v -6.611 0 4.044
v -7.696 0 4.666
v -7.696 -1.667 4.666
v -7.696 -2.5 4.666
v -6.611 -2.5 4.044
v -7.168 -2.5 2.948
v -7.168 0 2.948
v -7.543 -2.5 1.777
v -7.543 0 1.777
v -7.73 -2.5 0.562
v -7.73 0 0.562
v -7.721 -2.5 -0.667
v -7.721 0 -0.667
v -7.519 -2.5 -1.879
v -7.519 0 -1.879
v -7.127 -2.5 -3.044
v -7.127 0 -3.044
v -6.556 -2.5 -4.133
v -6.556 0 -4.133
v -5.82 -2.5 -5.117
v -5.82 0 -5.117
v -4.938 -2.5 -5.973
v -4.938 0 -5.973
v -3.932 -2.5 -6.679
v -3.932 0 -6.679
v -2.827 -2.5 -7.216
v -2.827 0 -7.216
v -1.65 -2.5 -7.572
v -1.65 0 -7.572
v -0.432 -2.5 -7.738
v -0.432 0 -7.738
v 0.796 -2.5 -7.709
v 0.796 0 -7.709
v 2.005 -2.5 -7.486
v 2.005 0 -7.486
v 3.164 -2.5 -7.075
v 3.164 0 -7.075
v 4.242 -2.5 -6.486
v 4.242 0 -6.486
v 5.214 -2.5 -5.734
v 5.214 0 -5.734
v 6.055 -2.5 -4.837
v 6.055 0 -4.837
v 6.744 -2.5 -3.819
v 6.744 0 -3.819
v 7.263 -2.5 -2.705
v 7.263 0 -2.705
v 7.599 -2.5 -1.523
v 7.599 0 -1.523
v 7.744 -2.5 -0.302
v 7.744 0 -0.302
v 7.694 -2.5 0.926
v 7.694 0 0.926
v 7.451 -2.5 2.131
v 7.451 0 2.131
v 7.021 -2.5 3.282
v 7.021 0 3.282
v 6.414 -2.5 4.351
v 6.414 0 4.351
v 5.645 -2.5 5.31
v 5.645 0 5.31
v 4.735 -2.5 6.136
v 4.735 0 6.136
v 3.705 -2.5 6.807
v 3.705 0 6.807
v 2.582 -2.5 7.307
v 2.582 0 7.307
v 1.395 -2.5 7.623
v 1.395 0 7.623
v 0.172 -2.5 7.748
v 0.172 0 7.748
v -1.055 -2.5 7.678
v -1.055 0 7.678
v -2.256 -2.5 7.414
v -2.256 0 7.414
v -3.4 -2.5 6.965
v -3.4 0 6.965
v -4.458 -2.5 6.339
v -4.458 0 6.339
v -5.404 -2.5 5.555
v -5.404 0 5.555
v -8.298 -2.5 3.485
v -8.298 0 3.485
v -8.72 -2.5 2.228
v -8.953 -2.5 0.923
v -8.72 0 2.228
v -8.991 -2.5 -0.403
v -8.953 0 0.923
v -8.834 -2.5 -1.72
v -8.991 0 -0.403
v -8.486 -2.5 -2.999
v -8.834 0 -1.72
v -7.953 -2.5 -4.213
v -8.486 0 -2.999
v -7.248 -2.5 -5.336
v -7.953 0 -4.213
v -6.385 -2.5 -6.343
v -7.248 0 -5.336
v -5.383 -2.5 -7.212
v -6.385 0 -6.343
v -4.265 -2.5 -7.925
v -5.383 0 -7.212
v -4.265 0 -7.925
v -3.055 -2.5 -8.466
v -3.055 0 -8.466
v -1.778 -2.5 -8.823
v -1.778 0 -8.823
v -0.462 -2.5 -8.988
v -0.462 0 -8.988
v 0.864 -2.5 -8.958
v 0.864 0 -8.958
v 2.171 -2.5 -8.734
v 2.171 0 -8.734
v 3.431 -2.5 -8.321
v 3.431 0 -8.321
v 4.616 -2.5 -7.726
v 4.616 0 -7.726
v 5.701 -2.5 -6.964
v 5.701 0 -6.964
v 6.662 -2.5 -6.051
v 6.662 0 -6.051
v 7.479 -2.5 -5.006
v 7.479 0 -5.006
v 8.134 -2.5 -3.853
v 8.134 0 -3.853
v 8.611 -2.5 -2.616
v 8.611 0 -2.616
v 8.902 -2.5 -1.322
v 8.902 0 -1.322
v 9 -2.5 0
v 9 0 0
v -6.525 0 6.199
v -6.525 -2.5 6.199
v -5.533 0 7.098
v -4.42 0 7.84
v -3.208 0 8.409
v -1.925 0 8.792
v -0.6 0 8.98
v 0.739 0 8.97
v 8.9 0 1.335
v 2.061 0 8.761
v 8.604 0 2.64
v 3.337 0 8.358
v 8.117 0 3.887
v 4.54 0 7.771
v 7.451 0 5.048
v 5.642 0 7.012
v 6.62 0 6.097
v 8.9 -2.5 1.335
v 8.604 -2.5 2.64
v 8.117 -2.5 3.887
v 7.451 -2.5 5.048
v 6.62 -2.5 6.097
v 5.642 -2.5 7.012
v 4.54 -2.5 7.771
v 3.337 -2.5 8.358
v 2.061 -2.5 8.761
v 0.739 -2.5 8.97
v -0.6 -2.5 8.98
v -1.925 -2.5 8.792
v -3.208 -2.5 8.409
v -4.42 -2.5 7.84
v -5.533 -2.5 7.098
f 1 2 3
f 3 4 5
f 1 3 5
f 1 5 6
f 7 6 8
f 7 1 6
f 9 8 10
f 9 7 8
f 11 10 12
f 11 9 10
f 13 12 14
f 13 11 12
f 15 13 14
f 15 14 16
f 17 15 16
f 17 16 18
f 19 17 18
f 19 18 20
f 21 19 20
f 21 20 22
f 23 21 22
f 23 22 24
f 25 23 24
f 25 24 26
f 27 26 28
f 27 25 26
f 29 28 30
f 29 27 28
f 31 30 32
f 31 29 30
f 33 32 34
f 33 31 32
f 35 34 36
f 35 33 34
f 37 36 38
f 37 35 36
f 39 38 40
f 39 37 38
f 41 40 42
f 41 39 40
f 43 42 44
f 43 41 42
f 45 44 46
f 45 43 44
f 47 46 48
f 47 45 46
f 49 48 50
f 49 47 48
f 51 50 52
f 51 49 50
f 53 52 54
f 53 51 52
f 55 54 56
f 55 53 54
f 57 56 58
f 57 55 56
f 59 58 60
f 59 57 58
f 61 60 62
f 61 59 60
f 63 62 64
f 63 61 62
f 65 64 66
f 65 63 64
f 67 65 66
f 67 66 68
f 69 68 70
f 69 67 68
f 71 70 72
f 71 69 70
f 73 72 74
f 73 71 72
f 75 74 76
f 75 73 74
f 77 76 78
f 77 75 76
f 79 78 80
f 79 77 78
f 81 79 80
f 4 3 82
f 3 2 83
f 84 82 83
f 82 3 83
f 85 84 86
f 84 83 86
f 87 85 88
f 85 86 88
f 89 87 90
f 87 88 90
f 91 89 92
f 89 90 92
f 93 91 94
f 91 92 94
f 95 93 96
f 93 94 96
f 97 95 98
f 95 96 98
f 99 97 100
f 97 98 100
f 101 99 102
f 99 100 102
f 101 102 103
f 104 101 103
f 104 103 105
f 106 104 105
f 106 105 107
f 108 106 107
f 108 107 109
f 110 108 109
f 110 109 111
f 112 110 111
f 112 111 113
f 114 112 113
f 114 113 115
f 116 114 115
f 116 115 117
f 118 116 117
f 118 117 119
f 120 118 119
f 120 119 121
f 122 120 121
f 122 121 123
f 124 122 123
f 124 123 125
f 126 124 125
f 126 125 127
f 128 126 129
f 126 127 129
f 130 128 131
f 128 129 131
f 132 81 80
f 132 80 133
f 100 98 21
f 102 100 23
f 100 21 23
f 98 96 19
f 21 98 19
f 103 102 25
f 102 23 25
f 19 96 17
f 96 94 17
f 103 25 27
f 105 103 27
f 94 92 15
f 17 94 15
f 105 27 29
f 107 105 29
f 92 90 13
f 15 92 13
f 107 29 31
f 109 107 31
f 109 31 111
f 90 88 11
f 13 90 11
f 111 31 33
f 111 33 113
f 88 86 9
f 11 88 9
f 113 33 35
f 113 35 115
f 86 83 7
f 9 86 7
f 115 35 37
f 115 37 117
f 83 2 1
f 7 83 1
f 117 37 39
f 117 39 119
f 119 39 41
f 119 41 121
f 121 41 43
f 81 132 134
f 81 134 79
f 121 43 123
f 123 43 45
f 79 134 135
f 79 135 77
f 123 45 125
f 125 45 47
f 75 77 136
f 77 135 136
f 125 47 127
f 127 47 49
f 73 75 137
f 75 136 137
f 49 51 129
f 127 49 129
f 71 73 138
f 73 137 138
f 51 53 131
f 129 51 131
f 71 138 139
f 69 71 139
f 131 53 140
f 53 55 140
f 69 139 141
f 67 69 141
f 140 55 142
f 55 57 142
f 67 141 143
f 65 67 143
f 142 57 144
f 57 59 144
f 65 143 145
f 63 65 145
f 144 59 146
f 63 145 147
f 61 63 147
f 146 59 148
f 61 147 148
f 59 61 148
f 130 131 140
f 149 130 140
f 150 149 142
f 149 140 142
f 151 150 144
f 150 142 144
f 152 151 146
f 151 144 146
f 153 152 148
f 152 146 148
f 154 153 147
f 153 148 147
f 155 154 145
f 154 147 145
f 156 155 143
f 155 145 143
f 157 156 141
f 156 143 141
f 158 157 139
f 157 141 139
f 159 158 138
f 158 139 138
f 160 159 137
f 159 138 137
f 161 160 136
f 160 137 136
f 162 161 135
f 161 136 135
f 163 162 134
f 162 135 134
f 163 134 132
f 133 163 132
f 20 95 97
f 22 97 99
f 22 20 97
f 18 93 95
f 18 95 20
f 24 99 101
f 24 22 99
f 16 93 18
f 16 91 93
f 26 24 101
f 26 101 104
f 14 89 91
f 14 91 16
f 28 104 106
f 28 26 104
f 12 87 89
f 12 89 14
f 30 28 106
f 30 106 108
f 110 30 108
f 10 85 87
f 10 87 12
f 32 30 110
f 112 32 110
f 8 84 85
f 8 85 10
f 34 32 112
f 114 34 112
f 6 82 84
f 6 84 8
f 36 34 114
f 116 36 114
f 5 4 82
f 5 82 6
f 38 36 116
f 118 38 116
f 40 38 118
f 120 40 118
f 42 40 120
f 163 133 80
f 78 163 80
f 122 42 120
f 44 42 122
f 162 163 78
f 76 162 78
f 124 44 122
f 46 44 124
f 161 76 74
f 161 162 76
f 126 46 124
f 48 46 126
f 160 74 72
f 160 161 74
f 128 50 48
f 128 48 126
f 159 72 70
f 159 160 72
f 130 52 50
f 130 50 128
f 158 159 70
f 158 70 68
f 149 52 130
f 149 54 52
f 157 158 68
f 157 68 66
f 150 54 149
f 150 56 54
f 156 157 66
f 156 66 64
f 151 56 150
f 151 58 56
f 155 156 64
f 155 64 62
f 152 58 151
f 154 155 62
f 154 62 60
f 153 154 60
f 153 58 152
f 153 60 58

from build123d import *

# Parameters (mm, degrees)
F0_R     = 9
F0_R_2   = 7.75
F1_DEPTH = 2.5
F3_DEPTH = 25
F4_W     = 1.797143
F4_H     = 0.470712
F5_DEPTH = 25
F6_W     = 1.035781
F6_H     = 1.391272
F7_DEPTH = 25


with BuildPart() as f1:
    # F0 (on Front) → F1 (new body)
    with BuildSketch(Plane.XZ):
        Circle(F0_R)
        Circle(F0_R_2, mode=Mode.SUBTRACT)
    extrude(amount=F1_DEPTH)

    # F2 (on face) → F3 (cut)
    with BuildSketch(Plane.XZ.offset(2.5)):
        Polygon((-6.525024, 6.198715), (-7.695748, 4.666418), (-6.611456, 4.043655), (-5.404168, 5.55495), align=None)
    extrude(amount=-F3_DEPTH, mode=Mode.SUBTRACT)

    # F4 (on face) → F5 (cut)
    with BuildSketch(Plane.XZ.offset(2.5)):
        with Locations((-7.423595, 5.963359)):
            Rectangle(F4_W, F4_H)
    extrude(amount=-F5_DEPTH, mode=Mode.SUBTRACT)

    # F6 (on face) → F7 (cut)
    with BuildSketch(Plane.XZ.offset(2.5)):
        with Locations((-7.177858, 5.362054)):
            Rectangle(F6_W, F6_H)
    extrude(amount=-F7_DEPTH, mode=Mode.SUBTRACT)


solid = f1.part
